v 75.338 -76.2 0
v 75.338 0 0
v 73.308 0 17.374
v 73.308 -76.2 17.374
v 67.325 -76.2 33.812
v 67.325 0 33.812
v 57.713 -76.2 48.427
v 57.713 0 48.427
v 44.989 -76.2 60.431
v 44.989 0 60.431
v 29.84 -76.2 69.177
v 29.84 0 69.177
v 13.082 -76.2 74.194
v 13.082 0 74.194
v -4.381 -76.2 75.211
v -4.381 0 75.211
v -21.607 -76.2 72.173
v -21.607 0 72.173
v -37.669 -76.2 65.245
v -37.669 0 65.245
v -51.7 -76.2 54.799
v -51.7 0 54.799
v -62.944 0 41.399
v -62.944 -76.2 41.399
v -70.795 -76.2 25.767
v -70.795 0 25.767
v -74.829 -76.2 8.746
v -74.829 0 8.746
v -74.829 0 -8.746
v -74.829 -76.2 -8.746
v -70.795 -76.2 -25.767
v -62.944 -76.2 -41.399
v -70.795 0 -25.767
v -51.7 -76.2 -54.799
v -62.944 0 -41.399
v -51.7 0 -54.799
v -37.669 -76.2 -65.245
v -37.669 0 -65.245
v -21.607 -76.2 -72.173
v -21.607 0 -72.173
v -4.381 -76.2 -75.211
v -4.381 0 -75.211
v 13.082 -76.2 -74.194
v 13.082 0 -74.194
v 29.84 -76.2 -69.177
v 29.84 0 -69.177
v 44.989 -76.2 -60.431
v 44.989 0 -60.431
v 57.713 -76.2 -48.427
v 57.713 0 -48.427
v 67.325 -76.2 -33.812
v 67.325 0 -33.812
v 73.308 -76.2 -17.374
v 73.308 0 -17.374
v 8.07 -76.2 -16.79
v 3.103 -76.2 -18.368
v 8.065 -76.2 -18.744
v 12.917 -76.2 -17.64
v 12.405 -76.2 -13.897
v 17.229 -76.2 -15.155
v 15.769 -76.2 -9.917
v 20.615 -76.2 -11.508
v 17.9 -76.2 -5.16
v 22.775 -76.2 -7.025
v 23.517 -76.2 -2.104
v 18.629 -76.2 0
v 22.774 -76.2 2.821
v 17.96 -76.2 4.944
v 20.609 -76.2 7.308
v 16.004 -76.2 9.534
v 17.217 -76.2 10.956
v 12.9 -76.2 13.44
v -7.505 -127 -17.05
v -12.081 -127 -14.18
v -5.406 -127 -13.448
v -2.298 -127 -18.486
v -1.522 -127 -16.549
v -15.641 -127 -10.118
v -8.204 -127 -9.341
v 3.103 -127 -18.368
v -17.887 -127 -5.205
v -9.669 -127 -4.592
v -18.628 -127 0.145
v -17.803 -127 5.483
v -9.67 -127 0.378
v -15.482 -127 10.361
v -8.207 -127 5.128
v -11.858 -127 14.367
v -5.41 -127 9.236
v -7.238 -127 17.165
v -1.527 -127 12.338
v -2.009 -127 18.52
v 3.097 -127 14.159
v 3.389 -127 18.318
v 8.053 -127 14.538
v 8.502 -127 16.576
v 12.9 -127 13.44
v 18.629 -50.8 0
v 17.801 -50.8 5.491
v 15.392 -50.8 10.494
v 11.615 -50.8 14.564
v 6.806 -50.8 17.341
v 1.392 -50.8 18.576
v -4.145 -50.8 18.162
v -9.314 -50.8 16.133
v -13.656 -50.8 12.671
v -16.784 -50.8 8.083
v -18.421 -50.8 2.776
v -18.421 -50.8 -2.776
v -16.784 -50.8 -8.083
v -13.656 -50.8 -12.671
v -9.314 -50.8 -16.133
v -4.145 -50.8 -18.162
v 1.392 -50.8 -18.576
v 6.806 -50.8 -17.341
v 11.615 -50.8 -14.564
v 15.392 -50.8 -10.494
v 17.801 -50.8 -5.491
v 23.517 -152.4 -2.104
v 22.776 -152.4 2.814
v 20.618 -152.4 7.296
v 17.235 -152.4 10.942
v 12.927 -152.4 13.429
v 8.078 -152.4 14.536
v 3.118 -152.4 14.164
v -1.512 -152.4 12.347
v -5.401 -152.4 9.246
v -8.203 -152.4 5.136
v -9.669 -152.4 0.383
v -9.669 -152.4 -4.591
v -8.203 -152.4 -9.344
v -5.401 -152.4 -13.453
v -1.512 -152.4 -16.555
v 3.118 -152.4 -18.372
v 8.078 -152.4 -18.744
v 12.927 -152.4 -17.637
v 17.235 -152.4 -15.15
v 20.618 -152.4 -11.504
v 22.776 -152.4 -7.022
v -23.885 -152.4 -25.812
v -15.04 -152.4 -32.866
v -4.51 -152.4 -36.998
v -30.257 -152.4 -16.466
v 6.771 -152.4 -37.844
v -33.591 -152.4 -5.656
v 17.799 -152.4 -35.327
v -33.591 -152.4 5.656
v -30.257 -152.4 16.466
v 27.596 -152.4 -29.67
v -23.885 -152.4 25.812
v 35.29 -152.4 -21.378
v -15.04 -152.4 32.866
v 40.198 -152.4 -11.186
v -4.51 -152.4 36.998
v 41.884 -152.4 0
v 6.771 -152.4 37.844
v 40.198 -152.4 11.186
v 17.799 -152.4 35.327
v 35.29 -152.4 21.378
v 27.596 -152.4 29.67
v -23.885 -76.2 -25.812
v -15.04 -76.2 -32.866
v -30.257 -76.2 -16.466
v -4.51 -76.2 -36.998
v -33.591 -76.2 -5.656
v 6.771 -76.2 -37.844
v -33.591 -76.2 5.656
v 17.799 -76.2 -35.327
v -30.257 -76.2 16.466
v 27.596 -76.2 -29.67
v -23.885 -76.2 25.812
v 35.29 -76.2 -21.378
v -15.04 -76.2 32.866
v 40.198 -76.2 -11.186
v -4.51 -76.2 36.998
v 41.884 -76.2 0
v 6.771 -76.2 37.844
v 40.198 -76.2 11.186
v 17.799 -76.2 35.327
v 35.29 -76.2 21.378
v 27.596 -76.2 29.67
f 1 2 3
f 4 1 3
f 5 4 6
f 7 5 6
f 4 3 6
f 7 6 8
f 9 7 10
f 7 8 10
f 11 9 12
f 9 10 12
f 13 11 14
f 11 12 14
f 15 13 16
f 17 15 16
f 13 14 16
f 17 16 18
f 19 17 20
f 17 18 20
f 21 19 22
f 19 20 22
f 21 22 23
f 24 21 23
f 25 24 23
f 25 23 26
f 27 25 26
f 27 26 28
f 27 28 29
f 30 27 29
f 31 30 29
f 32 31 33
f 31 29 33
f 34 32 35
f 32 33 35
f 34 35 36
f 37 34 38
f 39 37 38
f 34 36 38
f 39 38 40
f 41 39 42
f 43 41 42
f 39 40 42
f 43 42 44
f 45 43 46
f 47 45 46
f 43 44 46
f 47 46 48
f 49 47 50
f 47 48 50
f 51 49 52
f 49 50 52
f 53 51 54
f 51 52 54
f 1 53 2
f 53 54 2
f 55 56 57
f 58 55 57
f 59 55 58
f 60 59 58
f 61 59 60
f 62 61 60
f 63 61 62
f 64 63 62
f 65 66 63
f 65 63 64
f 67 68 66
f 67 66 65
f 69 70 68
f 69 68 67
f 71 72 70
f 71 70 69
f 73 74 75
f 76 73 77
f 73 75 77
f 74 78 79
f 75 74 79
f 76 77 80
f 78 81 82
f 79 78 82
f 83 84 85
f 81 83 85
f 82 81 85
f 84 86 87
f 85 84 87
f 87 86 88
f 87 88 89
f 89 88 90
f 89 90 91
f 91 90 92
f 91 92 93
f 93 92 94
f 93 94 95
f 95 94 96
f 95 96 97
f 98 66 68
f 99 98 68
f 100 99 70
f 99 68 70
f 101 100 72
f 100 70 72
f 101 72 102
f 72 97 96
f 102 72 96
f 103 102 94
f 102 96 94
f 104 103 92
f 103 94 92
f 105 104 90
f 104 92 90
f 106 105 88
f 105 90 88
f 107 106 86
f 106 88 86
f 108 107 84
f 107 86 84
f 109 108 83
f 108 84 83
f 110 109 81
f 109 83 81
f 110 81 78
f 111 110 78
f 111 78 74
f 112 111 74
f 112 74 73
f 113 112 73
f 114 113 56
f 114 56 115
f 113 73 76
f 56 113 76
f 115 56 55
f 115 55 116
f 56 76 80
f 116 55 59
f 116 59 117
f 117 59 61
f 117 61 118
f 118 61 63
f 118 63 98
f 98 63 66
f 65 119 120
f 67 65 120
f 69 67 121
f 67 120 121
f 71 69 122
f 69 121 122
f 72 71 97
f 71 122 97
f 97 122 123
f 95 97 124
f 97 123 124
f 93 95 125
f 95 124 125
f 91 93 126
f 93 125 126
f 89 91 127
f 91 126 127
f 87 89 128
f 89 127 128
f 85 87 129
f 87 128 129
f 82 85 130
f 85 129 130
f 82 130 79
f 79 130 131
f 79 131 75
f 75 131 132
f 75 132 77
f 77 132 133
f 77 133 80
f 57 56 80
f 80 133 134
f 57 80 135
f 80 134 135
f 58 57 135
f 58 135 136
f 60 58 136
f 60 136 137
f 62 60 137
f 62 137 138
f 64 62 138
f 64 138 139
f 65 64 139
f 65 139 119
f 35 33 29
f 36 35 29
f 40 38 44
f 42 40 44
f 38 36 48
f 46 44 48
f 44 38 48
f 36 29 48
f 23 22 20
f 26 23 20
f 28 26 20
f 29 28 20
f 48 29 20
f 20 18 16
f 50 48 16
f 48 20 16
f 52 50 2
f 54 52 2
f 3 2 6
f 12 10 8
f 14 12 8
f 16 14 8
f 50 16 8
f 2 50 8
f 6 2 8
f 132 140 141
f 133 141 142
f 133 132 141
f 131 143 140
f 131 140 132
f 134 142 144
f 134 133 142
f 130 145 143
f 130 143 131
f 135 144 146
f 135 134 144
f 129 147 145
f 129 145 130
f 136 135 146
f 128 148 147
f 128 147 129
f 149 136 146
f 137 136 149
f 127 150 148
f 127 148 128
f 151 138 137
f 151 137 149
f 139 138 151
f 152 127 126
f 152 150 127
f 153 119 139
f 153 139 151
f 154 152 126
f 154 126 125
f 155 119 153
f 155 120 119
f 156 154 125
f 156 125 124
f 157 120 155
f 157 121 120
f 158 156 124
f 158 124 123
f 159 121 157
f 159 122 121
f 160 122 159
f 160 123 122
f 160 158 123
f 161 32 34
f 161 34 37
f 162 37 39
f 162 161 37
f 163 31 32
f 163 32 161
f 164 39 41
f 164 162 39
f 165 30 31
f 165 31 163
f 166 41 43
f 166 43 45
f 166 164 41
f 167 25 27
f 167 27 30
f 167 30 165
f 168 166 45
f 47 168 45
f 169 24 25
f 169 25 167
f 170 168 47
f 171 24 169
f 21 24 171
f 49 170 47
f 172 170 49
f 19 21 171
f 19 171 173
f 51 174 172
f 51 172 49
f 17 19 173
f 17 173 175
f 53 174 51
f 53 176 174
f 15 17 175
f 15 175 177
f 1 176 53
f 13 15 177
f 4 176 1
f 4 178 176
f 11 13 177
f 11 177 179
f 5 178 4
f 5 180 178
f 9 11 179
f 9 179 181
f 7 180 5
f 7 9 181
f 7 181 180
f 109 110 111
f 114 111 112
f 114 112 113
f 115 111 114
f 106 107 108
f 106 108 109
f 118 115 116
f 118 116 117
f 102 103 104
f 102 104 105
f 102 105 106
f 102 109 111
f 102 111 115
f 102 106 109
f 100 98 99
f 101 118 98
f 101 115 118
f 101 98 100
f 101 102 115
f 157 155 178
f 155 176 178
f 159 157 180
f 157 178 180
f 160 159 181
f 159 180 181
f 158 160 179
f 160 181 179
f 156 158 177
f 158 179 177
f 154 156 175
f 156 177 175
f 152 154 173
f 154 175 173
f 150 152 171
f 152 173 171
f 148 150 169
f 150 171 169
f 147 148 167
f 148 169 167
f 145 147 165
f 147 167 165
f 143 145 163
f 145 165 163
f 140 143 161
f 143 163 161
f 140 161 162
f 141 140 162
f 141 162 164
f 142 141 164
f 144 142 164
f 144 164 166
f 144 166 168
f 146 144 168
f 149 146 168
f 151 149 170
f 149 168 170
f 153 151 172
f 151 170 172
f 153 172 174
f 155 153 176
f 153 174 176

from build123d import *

# Parameters (mm, degrees)
F0_R      = 75.3383577212
F1_DEPTH  = 76.2
F2_R      = 37.9498660495
F3_DEPTH  = 127
F5_R      = 18.6285804239
F6_DEPTH  = 76.2
F4_R      = 37.9498660495
F7_DEPTH  = 76.2
F8_DEPTH  = 50.8
F9_R      = 16.6862695849
F10_DEPTH = 76.2


with BuildPart() as f1:
    # F0 (on Front) → F1 (new body)
    with BuildSketch(Plane.XZ):
        Circle(F0_R)
    extrude(amount=F1_DEPTH)

    # F2 (on Front) → F3 (join)
    with BuildSketch(Plane.XZ):
        with Locations((3.9345594123, 0)):
            Circle(F2_R)
    extrude(amount=F3_DEPTH)

    # F5 (on face) → F6 (cut)
    with BuildSketch(Plane.XZ.offset(127)):
        Circle(F5_R)
    extrude(amount=-F6_DEPTH, mode=Mode.SUBTRACT)

    # F4 (on face) → F7 (join)
    with BuildSketch(Plane.XZ.offset(127)):
        with Locations((3.9345594123, 0)):
            Circle(F4_R)
    extrude(amount=F7_DEPTH)

    # F8 (cut): a face of the model
    f8_faces = [f1.faces().sort_by_distance(p)[0] for p in [
        (3.9345594123, -203.2, 0),
    ]]
    extrude(f8_faces, amount=-F8_DEPTH, mode=Mode.SUBTRACT)

    # F9 (on face) → F10 (cut)
    with BuildSketch(Plane.XZ.offset(152.4)):
        with Locations((6.8308734335, -2.1039112471)):
            Circle(F9_R)
    extrude(amount=-F10_DEPTH, mode=Mode.SUBTRACT)


solid = f1.part
